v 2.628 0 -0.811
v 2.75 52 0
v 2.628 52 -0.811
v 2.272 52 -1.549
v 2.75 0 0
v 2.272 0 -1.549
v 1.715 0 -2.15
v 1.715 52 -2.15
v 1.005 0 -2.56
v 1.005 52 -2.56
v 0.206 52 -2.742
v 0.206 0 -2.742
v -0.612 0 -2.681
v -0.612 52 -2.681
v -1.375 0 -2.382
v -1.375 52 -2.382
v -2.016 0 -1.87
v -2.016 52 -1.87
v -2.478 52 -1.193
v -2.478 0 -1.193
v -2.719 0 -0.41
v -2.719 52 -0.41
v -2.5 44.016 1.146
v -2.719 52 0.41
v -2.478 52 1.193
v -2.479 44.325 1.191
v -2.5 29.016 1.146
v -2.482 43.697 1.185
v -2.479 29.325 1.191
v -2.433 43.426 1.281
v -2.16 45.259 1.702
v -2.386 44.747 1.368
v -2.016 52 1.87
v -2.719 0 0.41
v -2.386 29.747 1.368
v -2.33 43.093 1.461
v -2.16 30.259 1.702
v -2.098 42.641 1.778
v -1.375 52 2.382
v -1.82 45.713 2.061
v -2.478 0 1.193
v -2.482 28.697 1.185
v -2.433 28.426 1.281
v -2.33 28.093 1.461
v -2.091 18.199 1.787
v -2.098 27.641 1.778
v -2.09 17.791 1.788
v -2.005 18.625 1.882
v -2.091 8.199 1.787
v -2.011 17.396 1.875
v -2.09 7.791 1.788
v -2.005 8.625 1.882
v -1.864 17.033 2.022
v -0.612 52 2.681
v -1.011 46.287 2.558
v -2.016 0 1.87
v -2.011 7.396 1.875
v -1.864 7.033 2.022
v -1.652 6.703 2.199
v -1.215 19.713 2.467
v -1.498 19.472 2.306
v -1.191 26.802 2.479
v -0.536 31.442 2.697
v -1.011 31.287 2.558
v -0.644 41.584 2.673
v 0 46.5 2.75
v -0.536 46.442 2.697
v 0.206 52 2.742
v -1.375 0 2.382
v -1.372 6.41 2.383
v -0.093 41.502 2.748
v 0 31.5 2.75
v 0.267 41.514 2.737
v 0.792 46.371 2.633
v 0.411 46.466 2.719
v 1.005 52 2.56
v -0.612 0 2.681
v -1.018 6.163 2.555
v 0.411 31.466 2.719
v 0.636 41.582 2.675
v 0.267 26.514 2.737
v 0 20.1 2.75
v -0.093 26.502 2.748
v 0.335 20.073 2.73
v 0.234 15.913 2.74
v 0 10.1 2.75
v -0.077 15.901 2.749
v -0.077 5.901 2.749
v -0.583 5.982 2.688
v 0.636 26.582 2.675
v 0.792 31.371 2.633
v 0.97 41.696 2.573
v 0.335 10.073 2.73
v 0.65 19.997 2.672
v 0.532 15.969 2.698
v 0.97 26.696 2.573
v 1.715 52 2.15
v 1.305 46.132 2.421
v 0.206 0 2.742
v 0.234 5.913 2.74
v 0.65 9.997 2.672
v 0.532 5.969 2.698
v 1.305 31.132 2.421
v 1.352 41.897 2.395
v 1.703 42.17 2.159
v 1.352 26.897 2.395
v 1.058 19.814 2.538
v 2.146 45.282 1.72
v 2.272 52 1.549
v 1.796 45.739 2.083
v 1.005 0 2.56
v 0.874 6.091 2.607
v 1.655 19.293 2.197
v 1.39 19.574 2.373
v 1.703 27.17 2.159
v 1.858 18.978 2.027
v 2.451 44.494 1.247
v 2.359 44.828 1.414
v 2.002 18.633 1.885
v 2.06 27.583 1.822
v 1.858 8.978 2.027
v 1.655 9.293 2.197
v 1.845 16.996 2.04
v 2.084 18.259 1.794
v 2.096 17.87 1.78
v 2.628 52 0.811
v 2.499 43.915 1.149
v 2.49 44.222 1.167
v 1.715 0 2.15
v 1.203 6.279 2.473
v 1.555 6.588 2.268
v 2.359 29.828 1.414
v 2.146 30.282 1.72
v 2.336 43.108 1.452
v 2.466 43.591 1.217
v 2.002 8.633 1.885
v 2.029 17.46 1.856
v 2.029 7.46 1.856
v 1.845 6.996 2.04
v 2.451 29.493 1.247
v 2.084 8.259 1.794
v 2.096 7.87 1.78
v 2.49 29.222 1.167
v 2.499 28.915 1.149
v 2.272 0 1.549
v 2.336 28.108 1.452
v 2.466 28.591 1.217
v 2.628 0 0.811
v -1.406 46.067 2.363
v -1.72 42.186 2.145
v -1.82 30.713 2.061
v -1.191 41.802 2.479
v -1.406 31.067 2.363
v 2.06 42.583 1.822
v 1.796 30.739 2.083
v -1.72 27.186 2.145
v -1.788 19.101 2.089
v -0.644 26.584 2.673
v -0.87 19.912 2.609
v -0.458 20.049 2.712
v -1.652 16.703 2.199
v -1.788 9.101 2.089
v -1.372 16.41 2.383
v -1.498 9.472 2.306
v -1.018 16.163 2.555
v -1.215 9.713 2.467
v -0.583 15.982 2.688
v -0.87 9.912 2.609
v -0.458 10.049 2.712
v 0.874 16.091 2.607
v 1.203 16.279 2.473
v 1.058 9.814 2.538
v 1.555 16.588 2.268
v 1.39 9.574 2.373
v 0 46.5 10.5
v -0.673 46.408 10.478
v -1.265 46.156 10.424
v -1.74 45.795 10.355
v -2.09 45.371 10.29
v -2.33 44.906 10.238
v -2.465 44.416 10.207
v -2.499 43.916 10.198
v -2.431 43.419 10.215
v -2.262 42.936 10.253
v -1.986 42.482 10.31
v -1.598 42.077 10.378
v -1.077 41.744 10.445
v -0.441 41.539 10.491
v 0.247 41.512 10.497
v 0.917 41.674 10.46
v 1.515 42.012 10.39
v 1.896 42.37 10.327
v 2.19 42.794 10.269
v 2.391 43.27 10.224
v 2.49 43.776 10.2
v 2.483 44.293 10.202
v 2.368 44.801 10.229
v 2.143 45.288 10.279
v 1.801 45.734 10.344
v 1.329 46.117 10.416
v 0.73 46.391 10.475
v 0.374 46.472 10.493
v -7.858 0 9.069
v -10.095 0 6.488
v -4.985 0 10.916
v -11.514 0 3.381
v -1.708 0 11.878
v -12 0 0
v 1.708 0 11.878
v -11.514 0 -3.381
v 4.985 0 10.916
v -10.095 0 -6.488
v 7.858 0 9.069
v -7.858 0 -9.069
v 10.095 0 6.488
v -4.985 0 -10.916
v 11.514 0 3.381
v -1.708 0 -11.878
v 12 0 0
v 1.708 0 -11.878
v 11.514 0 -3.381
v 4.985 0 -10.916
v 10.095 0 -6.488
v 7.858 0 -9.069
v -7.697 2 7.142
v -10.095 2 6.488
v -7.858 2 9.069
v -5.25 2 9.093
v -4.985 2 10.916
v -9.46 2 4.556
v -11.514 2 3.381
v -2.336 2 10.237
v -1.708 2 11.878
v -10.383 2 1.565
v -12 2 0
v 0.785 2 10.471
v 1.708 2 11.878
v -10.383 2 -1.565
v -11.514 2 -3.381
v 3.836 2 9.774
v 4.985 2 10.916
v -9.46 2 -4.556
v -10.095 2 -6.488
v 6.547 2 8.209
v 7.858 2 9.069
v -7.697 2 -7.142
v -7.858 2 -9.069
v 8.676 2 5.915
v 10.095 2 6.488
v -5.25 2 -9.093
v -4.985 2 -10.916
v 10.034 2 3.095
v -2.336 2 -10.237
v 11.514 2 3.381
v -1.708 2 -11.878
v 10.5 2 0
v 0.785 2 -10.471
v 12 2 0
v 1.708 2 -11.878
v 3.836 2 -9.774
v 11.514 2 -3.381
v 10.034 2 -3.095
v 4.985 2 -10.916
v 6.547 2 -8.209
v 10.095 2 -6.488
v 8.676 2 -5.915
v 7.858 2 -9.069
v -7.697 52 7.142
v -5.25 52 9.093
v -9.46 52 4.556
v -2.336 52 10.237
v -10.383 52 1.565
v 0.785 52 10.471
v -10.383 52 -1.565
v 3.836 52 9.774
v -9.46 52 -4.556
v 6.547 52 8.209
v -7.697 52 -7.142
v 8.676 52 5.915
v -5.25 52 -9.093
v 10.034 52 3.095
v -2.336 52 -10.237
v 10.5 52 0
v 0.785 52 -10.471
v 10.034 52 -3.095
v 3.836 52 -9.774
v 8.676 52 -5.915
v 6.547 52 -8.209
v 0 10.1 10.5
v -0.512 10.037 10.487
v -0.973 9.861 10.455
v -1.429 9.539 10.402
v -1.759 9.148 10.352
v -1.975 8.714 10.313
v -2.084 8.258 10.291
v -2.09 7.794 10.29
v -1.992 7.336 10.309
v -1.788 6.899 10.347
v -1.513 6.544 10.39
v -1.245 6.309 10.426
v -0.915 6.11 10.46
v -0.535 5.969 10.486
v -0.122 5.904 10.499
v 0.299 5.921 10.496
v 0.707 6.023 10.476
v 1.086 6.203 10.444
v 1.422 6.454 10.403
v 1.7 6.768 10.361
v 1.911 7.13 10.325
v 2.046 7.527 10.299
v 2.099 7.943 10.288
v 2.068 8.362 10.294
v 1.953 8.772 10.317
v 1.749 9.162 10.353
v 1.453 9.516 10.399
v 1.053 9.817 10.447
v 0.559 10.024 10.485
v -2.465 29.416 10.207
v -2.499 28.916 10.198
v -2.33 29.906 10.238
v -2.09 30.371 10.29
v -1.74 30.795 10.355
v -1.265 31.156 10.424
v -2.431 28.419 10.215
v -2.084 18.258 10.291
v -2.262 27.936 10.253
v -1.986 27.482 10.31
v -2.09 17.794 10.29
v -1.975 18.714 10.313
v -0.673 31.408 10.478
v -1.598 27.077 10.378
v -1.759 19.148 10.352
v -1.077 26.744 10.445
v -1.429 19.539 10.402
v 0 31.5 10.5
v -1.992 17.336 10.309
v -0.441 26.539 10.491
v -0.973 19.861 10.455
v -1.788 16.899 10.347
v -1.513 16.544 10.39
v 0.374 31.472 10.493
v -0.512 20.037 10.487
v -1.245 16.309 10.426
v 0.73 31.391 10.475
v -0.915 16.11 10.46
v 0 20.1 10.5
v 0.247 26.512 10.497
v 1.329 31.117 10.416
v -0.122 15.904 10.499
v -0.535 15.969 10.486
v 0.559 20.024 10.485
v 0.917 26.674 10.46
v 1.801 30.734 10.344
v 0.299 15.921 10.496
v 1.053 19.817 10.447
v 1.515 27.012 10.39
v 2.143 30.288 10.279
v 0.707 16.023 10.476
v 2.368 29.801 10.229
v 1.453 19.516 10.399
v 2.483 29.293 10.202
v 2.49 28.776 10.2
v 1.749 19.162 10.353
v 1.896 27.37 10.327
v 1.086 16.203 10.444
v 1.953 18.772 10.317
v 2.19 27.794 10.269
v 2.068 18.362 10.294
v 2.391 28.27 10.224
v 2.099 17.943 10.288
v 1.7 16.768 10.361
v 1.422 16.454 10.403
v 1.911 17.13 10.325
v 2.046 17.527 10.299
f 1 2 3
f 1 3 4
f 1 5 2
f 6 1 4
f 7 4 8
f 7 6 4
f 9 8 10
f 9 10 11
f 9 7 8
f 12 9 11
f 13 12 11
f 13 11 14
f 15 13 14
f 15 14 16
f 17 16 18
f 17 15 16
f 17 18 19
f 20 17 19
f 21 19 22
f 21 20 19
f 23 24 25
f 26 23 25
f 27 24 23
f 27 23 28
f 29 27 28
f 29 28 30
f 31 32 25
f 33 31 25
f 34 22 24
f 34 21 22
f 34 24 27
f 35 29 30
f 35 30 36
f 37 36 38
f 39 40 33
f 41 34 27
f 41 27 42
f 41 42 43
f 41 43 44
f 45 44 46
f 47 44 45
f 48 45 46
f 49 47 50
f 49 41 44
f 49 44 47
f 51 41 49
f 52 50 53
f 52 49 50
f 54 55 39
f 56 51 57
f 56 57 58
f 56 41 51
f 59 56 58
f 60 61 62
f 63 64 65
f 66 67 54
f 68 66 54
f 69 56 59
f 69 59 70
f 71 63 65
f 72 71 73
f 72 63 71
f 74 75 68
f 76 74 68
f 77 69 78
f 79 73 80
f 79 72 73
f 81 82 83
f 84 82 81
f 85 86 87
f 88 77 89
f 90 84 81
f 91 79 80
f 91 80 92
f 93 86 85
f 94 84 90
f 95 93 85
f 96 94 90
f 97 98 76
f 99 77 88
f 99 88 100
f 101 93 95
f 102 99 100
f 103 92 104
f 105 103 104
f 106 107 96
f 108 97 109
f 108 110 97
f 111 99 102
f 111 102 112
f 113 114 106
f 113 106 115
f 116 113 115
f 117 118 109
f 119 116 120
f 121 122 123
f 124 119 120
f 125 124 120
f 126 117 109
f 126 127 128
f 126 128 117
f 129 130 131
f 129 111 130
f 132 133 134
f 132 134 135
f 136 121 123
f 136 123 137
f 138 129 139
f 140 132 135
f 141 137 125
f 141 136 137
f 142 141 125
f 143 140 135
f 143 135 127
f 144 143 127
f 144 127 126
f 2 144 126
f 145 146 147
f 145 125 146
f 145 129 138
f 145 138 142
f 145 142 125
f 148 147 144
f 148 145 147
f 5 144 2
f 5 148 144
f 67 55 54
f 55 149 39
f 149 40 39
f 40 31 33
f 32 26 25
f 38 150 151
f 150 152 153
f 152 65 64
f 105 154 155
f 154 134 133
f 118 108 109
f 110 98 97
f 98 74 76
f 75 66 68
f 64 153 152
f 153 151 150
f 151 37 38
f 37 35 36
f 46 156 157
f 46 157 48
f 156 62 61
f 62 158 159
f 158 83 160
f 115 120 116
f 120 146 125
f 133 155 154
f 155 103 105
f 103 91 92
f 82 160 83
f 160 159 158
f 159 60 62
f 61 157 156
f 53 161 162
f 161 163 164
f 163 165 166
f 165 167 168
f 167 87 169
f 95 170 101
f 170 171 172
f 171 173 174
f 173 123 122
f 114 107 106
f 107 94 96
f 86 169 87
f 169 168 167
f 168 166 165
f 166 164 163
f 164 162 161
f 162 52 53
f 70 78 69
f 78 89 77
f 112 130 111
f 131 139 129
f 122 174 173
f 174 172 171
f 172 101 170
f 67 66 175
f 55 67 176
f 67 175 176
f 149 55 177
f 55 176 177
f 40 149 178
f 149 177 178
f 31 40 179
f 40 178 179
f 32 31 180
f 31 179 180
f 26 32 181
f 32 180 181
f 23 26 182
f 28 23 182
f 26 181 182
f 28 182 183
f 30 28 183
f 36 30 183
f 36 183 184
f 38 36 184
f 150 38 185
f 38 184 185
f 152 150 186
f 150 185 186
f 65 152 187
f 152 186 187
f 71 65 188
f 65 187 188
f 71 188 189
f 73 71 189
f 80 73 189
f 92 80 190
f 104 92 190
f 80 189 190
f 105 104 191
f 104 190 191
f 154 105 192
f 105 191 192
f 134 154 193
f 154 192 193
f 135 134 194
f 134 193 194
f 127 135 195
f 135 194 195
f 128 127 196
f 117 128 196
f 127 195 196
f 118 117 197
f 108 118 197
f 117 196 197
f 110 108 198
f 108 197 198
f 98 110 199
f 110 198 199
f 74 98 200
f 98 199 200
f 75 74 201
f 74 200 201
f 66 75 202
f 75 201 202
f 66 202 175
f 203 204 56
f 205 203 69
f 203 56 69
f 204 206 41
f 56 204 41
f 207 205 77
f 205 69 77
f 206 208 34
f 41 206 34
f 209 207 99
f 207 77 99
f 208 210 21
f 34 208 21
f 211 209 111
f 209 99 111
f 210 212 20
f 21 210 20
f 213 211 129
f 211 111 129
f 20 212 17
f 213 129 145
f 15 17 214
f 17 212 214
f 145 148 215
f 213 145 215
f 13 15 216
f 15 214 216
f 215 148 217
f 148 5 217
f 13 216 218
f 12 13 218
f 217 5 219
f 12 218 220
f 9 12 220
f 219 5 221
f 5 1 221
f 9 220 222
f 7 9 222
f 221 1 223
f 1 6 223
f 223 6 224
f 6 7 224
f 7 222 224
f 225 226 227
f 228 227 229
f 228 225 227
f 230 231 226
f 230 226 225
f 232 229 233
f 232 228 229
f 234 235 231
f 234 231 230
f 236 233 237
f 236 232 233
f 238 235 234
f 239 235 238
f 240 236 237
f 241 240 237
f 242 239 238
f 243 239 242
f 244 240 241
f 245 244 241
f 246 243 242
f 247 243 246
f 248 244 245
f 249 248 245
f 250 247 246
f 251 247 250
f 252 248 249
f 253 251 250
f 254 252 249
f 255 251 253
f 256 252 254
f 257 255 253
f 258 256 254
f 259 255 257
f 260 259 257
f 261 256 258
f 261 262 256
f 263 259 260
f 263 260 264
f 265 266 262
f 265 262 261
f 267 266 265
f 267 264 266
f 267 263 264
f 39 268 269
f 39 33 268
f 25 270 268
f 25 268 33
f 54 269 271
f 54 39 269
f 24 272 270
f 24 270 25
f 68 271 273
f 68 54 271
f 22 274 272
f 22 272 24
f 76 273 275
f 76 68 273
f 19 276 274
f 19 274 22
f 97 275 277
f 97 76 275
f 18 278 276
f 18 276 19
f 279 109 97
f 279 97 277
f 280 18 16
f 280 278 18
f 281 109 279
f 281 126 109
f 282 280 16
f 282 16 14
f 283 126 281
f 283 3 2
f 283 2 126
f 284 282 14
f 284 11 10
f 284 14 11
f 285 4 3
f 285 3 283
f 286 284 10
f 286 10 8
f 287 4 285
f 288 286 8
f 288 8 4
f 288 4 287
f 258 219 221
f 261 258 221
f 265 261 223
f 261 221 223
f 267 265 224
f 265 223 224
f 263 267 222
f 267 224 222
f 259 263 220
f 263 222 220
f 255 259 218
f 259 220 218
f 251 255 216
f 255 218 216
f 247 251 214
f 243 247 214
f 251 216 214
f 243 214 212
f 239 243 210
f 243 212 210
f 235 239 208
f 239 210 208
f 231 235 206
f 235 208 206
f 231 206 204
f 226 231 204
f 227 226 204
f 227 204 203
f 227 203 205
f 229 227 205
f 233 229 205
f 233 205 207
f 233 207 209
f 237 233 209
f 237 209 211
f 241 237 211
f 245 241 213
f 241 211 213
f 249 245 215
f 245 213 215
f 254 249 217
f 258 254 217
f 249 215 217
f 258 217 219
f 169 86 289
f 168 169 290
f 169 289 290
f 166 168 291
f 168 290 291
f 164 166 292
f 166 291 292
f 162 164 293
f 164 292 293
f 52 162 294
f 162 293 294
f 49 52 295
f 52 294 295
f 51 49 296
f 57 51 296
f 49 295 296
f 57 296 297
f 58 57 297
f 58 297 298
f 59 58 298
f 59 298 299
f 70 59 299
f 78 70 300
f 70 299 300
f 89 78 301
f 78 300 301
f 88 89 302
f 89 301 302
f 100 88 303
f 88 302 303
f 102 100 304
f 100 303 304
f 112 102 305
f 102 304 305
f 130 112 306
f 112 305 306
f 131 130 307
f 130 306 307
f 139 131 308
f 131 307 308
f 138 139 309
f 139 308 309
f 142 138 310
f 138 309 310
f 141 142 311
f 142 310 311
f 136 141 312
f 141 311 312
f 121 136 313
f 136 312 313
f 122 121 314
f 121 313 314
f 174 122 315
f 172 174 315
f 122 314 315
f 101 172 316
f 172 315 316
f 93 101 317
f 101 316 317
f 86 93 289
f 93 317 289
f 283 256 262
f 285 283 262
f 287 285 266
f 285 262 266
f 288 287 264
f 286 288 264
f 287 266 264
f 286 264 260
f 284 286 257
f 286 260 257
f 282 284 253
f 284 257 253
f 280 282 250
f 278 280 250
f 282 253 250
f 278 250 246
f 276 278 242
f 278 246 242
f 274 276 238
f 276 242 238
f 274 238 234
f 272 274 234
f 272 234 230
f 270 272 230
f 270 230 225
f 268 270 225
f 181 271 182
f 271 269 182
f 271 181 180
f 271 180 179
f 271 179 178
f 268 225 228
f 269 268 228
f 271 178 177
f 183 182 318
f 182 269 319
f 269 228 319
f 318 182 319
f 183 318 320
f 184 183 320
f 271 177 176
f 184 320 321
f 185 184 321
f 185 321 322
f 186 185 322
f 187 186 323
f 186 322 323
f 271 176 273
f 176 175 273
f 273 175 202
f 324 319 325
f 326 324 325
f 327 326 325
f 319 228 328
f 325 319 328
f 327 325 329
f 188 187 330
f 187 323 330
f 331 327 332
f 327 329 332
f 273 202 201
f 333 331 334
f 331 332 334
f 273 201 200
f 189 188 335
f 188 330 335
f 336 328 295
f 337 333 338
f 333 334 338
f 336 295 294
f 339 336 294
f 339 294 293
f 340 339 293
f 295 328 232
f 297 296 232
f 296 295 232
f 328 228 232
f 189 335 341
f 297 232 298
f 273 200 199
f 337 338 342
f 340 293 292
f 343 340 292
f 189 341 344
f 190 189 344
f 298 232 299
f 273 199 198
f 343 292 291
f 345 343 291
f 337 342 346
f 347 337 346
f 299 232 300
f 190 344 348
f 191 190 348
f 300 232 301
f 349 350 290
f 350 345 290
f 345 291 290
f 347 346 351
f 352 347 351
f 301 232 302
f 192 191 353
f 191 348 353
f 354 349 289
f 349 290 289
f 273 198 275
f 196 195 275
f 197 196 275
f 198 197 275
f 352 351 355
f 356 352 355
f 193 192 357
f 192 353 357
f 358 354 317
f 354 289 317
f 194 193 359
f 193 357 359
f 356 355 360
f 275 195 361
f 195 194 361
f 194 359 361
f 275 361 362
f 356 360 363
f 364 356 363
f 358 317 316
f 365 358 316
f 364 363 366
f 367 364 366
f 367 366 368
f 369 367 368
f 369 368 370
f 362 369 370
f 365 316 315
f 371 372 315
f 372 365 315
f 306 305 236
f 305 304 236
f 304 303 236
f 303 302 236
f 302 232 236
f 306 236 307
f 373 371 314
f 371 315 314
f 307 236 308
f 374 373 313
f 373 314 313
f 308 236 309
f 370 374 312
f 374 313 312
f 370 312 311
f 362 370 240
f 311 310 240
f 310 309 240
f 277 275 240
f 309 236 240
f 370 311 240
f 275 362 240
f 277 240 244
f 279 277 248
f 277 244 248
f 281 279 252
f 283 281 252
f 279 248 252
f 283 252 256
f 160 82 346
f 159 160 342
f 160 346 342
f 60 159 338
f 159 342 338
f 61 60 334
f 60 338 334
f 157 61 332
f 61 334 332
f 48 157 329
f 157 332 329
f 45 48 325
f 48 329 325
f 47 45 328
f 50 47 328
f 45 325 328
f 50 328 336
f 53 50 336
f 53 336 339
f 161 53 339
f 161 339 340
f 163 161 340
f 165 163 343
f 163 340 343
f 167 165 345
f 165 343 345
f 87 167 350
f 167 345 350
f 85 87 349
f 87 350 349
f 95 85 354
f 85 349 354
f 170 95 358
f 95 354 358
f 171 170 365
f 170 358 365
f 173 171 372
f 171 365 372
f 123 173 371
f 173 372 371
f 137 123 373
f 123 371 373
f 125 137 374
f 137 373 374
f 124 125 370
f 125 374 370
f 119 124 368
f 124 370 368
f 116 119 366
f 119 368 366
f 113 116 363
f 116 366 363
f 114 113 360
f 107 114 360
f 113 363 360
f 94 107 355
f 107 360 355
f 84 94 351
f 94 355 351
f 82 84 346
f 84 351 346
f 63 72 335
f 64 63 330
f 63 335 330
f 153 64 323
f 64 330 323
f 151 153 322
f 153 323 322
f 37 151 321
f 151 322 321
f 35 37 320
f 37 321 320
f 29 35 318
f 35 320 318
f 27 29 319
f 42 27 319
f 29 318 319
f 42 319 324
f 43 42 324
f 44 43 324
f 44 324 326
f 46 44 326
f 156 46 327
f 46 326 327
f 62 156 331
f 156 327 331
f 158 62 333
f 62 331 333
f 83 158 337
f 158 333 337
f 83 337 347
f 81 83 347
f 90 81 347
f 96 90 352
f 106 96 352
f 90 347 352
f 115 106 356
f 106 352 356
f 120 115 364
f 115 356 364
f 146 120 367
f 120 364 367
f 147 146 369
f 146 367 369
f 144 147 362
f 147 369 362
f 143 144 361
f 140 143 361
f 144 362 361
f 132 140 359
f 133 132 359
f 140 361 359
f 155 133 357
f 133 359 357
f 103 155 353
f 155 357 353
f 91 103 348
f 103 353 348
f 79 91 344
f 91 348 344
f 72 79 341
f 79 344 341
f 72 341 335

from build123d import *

# Parameters (mm, degrees)
SKETCH_1_R                 = 12
SKETCH_1_R_2               = 2.75
EXTRUDE_1_DEPTH            = 2
SKETCH_2_R                 = 10.5
SKETCH_2_R_2               = 2.75
EXTRUDE_2_DEPTH            = 50
SKETCH_7_W                 = 2.1
SKETCH_7_H                 = 10.5
HOLE_WIZARD_M51_AT_2_COUNT = 2
HOLE_WIZARD_M51_AT_2_PITCH = 10
SKETCH_9_W                 = 2.5
SKETCH_9_H                 = 12
HOLE_WIZARD_M61_AT_2_COUNT = 2
HOLE_WIZARD_M61_AT_2_PITCH = 15


with BuildPart() as part:
    # Эскиз1 → Бобышка-Вытянуть1 (new body)
    with BuildSketch(Plane(origin=(0, 0, 0), x_dir=(1, 0, 0), z_dir=(0, 1, 0))):
        Circle(SKETCH_1_R)
        Circle(SKETCH_1_R_2, mode=Mode.SUBTRACT)
    extrude(amount=EXTRUDE_1_DEPTH)

    # Эскиз2 → Бобышка-Вытянуть2 (add)
    with BuildSketch(Plane(origin=(0, 2, 0), x_dir=(1, 0, 0), z_dir=(0, 1, 0))):
        Circle(SKETCH_2_R)
        Circle(SKETCH_2_R_2, mode=Mode.SUBTRACT)
    extrude(amount=EXTRUDE_2_DEPTH)

    # Эскиз7 → Отверстие обработанное метчиком M51 (revolve, cut)
    with BuildSketch(Plane(origin=(0, 8, 0), x_dir=(0, 1, 0), z_dir=(1, 0, 0))):
        with Locations((1.05, 5.25)):
            Rectangle(SKETCH_7_W, SKETCH_7_H)
    hole_wizard_m51 = revolve(axis=Axis((0, 8, -6.35), (0, 0, 1)), mode=Mode.SUBTRACT)

    # Отверстие обработанное метчиком M51 at 2: Отверстие обработанное метчиком M51 ×2
    with Locations(*[(0, i * HOLE_WIZARD_M51_AT_2_PITCH, 0) for i in range(1, HOLE_WIZARD_M51_AT_2_COUNT)]):
        add(hole_wizard_m51, mode=Mode.SUBTRACT)

    # Эскиз9 → Отверстие обработанное метчиком M61 (revolve, cut)
    with BuildSketch(Plane(origin=(0, 44, 0), x_dir=(0, 1, 0), z_dir=(1, 0, 0))):
        with Locations((1.25, 6)):
            Rectangle(SKETCH_9_W, SKETCH_9_H)
    hole_wizard_m61 = revolve(axis=Axis((0, 44, -6.35), (0, 0, 1)), mode=Mode.SUBTRACT)

    # Отверстие обработанное метчиком M61 at 2: Отверстие обработанное метчиком M61 ×2
    with Locations(*[(0, -i * HOLE_WIZARD_M61_AT_2_PITCH, 0) for i in range(1, HOLE_WIZARD_M61_AT_2_COUNT)]):
        add(hole_wizard_m61, mode=Mode.SUBTRACT)


solid = part.part
